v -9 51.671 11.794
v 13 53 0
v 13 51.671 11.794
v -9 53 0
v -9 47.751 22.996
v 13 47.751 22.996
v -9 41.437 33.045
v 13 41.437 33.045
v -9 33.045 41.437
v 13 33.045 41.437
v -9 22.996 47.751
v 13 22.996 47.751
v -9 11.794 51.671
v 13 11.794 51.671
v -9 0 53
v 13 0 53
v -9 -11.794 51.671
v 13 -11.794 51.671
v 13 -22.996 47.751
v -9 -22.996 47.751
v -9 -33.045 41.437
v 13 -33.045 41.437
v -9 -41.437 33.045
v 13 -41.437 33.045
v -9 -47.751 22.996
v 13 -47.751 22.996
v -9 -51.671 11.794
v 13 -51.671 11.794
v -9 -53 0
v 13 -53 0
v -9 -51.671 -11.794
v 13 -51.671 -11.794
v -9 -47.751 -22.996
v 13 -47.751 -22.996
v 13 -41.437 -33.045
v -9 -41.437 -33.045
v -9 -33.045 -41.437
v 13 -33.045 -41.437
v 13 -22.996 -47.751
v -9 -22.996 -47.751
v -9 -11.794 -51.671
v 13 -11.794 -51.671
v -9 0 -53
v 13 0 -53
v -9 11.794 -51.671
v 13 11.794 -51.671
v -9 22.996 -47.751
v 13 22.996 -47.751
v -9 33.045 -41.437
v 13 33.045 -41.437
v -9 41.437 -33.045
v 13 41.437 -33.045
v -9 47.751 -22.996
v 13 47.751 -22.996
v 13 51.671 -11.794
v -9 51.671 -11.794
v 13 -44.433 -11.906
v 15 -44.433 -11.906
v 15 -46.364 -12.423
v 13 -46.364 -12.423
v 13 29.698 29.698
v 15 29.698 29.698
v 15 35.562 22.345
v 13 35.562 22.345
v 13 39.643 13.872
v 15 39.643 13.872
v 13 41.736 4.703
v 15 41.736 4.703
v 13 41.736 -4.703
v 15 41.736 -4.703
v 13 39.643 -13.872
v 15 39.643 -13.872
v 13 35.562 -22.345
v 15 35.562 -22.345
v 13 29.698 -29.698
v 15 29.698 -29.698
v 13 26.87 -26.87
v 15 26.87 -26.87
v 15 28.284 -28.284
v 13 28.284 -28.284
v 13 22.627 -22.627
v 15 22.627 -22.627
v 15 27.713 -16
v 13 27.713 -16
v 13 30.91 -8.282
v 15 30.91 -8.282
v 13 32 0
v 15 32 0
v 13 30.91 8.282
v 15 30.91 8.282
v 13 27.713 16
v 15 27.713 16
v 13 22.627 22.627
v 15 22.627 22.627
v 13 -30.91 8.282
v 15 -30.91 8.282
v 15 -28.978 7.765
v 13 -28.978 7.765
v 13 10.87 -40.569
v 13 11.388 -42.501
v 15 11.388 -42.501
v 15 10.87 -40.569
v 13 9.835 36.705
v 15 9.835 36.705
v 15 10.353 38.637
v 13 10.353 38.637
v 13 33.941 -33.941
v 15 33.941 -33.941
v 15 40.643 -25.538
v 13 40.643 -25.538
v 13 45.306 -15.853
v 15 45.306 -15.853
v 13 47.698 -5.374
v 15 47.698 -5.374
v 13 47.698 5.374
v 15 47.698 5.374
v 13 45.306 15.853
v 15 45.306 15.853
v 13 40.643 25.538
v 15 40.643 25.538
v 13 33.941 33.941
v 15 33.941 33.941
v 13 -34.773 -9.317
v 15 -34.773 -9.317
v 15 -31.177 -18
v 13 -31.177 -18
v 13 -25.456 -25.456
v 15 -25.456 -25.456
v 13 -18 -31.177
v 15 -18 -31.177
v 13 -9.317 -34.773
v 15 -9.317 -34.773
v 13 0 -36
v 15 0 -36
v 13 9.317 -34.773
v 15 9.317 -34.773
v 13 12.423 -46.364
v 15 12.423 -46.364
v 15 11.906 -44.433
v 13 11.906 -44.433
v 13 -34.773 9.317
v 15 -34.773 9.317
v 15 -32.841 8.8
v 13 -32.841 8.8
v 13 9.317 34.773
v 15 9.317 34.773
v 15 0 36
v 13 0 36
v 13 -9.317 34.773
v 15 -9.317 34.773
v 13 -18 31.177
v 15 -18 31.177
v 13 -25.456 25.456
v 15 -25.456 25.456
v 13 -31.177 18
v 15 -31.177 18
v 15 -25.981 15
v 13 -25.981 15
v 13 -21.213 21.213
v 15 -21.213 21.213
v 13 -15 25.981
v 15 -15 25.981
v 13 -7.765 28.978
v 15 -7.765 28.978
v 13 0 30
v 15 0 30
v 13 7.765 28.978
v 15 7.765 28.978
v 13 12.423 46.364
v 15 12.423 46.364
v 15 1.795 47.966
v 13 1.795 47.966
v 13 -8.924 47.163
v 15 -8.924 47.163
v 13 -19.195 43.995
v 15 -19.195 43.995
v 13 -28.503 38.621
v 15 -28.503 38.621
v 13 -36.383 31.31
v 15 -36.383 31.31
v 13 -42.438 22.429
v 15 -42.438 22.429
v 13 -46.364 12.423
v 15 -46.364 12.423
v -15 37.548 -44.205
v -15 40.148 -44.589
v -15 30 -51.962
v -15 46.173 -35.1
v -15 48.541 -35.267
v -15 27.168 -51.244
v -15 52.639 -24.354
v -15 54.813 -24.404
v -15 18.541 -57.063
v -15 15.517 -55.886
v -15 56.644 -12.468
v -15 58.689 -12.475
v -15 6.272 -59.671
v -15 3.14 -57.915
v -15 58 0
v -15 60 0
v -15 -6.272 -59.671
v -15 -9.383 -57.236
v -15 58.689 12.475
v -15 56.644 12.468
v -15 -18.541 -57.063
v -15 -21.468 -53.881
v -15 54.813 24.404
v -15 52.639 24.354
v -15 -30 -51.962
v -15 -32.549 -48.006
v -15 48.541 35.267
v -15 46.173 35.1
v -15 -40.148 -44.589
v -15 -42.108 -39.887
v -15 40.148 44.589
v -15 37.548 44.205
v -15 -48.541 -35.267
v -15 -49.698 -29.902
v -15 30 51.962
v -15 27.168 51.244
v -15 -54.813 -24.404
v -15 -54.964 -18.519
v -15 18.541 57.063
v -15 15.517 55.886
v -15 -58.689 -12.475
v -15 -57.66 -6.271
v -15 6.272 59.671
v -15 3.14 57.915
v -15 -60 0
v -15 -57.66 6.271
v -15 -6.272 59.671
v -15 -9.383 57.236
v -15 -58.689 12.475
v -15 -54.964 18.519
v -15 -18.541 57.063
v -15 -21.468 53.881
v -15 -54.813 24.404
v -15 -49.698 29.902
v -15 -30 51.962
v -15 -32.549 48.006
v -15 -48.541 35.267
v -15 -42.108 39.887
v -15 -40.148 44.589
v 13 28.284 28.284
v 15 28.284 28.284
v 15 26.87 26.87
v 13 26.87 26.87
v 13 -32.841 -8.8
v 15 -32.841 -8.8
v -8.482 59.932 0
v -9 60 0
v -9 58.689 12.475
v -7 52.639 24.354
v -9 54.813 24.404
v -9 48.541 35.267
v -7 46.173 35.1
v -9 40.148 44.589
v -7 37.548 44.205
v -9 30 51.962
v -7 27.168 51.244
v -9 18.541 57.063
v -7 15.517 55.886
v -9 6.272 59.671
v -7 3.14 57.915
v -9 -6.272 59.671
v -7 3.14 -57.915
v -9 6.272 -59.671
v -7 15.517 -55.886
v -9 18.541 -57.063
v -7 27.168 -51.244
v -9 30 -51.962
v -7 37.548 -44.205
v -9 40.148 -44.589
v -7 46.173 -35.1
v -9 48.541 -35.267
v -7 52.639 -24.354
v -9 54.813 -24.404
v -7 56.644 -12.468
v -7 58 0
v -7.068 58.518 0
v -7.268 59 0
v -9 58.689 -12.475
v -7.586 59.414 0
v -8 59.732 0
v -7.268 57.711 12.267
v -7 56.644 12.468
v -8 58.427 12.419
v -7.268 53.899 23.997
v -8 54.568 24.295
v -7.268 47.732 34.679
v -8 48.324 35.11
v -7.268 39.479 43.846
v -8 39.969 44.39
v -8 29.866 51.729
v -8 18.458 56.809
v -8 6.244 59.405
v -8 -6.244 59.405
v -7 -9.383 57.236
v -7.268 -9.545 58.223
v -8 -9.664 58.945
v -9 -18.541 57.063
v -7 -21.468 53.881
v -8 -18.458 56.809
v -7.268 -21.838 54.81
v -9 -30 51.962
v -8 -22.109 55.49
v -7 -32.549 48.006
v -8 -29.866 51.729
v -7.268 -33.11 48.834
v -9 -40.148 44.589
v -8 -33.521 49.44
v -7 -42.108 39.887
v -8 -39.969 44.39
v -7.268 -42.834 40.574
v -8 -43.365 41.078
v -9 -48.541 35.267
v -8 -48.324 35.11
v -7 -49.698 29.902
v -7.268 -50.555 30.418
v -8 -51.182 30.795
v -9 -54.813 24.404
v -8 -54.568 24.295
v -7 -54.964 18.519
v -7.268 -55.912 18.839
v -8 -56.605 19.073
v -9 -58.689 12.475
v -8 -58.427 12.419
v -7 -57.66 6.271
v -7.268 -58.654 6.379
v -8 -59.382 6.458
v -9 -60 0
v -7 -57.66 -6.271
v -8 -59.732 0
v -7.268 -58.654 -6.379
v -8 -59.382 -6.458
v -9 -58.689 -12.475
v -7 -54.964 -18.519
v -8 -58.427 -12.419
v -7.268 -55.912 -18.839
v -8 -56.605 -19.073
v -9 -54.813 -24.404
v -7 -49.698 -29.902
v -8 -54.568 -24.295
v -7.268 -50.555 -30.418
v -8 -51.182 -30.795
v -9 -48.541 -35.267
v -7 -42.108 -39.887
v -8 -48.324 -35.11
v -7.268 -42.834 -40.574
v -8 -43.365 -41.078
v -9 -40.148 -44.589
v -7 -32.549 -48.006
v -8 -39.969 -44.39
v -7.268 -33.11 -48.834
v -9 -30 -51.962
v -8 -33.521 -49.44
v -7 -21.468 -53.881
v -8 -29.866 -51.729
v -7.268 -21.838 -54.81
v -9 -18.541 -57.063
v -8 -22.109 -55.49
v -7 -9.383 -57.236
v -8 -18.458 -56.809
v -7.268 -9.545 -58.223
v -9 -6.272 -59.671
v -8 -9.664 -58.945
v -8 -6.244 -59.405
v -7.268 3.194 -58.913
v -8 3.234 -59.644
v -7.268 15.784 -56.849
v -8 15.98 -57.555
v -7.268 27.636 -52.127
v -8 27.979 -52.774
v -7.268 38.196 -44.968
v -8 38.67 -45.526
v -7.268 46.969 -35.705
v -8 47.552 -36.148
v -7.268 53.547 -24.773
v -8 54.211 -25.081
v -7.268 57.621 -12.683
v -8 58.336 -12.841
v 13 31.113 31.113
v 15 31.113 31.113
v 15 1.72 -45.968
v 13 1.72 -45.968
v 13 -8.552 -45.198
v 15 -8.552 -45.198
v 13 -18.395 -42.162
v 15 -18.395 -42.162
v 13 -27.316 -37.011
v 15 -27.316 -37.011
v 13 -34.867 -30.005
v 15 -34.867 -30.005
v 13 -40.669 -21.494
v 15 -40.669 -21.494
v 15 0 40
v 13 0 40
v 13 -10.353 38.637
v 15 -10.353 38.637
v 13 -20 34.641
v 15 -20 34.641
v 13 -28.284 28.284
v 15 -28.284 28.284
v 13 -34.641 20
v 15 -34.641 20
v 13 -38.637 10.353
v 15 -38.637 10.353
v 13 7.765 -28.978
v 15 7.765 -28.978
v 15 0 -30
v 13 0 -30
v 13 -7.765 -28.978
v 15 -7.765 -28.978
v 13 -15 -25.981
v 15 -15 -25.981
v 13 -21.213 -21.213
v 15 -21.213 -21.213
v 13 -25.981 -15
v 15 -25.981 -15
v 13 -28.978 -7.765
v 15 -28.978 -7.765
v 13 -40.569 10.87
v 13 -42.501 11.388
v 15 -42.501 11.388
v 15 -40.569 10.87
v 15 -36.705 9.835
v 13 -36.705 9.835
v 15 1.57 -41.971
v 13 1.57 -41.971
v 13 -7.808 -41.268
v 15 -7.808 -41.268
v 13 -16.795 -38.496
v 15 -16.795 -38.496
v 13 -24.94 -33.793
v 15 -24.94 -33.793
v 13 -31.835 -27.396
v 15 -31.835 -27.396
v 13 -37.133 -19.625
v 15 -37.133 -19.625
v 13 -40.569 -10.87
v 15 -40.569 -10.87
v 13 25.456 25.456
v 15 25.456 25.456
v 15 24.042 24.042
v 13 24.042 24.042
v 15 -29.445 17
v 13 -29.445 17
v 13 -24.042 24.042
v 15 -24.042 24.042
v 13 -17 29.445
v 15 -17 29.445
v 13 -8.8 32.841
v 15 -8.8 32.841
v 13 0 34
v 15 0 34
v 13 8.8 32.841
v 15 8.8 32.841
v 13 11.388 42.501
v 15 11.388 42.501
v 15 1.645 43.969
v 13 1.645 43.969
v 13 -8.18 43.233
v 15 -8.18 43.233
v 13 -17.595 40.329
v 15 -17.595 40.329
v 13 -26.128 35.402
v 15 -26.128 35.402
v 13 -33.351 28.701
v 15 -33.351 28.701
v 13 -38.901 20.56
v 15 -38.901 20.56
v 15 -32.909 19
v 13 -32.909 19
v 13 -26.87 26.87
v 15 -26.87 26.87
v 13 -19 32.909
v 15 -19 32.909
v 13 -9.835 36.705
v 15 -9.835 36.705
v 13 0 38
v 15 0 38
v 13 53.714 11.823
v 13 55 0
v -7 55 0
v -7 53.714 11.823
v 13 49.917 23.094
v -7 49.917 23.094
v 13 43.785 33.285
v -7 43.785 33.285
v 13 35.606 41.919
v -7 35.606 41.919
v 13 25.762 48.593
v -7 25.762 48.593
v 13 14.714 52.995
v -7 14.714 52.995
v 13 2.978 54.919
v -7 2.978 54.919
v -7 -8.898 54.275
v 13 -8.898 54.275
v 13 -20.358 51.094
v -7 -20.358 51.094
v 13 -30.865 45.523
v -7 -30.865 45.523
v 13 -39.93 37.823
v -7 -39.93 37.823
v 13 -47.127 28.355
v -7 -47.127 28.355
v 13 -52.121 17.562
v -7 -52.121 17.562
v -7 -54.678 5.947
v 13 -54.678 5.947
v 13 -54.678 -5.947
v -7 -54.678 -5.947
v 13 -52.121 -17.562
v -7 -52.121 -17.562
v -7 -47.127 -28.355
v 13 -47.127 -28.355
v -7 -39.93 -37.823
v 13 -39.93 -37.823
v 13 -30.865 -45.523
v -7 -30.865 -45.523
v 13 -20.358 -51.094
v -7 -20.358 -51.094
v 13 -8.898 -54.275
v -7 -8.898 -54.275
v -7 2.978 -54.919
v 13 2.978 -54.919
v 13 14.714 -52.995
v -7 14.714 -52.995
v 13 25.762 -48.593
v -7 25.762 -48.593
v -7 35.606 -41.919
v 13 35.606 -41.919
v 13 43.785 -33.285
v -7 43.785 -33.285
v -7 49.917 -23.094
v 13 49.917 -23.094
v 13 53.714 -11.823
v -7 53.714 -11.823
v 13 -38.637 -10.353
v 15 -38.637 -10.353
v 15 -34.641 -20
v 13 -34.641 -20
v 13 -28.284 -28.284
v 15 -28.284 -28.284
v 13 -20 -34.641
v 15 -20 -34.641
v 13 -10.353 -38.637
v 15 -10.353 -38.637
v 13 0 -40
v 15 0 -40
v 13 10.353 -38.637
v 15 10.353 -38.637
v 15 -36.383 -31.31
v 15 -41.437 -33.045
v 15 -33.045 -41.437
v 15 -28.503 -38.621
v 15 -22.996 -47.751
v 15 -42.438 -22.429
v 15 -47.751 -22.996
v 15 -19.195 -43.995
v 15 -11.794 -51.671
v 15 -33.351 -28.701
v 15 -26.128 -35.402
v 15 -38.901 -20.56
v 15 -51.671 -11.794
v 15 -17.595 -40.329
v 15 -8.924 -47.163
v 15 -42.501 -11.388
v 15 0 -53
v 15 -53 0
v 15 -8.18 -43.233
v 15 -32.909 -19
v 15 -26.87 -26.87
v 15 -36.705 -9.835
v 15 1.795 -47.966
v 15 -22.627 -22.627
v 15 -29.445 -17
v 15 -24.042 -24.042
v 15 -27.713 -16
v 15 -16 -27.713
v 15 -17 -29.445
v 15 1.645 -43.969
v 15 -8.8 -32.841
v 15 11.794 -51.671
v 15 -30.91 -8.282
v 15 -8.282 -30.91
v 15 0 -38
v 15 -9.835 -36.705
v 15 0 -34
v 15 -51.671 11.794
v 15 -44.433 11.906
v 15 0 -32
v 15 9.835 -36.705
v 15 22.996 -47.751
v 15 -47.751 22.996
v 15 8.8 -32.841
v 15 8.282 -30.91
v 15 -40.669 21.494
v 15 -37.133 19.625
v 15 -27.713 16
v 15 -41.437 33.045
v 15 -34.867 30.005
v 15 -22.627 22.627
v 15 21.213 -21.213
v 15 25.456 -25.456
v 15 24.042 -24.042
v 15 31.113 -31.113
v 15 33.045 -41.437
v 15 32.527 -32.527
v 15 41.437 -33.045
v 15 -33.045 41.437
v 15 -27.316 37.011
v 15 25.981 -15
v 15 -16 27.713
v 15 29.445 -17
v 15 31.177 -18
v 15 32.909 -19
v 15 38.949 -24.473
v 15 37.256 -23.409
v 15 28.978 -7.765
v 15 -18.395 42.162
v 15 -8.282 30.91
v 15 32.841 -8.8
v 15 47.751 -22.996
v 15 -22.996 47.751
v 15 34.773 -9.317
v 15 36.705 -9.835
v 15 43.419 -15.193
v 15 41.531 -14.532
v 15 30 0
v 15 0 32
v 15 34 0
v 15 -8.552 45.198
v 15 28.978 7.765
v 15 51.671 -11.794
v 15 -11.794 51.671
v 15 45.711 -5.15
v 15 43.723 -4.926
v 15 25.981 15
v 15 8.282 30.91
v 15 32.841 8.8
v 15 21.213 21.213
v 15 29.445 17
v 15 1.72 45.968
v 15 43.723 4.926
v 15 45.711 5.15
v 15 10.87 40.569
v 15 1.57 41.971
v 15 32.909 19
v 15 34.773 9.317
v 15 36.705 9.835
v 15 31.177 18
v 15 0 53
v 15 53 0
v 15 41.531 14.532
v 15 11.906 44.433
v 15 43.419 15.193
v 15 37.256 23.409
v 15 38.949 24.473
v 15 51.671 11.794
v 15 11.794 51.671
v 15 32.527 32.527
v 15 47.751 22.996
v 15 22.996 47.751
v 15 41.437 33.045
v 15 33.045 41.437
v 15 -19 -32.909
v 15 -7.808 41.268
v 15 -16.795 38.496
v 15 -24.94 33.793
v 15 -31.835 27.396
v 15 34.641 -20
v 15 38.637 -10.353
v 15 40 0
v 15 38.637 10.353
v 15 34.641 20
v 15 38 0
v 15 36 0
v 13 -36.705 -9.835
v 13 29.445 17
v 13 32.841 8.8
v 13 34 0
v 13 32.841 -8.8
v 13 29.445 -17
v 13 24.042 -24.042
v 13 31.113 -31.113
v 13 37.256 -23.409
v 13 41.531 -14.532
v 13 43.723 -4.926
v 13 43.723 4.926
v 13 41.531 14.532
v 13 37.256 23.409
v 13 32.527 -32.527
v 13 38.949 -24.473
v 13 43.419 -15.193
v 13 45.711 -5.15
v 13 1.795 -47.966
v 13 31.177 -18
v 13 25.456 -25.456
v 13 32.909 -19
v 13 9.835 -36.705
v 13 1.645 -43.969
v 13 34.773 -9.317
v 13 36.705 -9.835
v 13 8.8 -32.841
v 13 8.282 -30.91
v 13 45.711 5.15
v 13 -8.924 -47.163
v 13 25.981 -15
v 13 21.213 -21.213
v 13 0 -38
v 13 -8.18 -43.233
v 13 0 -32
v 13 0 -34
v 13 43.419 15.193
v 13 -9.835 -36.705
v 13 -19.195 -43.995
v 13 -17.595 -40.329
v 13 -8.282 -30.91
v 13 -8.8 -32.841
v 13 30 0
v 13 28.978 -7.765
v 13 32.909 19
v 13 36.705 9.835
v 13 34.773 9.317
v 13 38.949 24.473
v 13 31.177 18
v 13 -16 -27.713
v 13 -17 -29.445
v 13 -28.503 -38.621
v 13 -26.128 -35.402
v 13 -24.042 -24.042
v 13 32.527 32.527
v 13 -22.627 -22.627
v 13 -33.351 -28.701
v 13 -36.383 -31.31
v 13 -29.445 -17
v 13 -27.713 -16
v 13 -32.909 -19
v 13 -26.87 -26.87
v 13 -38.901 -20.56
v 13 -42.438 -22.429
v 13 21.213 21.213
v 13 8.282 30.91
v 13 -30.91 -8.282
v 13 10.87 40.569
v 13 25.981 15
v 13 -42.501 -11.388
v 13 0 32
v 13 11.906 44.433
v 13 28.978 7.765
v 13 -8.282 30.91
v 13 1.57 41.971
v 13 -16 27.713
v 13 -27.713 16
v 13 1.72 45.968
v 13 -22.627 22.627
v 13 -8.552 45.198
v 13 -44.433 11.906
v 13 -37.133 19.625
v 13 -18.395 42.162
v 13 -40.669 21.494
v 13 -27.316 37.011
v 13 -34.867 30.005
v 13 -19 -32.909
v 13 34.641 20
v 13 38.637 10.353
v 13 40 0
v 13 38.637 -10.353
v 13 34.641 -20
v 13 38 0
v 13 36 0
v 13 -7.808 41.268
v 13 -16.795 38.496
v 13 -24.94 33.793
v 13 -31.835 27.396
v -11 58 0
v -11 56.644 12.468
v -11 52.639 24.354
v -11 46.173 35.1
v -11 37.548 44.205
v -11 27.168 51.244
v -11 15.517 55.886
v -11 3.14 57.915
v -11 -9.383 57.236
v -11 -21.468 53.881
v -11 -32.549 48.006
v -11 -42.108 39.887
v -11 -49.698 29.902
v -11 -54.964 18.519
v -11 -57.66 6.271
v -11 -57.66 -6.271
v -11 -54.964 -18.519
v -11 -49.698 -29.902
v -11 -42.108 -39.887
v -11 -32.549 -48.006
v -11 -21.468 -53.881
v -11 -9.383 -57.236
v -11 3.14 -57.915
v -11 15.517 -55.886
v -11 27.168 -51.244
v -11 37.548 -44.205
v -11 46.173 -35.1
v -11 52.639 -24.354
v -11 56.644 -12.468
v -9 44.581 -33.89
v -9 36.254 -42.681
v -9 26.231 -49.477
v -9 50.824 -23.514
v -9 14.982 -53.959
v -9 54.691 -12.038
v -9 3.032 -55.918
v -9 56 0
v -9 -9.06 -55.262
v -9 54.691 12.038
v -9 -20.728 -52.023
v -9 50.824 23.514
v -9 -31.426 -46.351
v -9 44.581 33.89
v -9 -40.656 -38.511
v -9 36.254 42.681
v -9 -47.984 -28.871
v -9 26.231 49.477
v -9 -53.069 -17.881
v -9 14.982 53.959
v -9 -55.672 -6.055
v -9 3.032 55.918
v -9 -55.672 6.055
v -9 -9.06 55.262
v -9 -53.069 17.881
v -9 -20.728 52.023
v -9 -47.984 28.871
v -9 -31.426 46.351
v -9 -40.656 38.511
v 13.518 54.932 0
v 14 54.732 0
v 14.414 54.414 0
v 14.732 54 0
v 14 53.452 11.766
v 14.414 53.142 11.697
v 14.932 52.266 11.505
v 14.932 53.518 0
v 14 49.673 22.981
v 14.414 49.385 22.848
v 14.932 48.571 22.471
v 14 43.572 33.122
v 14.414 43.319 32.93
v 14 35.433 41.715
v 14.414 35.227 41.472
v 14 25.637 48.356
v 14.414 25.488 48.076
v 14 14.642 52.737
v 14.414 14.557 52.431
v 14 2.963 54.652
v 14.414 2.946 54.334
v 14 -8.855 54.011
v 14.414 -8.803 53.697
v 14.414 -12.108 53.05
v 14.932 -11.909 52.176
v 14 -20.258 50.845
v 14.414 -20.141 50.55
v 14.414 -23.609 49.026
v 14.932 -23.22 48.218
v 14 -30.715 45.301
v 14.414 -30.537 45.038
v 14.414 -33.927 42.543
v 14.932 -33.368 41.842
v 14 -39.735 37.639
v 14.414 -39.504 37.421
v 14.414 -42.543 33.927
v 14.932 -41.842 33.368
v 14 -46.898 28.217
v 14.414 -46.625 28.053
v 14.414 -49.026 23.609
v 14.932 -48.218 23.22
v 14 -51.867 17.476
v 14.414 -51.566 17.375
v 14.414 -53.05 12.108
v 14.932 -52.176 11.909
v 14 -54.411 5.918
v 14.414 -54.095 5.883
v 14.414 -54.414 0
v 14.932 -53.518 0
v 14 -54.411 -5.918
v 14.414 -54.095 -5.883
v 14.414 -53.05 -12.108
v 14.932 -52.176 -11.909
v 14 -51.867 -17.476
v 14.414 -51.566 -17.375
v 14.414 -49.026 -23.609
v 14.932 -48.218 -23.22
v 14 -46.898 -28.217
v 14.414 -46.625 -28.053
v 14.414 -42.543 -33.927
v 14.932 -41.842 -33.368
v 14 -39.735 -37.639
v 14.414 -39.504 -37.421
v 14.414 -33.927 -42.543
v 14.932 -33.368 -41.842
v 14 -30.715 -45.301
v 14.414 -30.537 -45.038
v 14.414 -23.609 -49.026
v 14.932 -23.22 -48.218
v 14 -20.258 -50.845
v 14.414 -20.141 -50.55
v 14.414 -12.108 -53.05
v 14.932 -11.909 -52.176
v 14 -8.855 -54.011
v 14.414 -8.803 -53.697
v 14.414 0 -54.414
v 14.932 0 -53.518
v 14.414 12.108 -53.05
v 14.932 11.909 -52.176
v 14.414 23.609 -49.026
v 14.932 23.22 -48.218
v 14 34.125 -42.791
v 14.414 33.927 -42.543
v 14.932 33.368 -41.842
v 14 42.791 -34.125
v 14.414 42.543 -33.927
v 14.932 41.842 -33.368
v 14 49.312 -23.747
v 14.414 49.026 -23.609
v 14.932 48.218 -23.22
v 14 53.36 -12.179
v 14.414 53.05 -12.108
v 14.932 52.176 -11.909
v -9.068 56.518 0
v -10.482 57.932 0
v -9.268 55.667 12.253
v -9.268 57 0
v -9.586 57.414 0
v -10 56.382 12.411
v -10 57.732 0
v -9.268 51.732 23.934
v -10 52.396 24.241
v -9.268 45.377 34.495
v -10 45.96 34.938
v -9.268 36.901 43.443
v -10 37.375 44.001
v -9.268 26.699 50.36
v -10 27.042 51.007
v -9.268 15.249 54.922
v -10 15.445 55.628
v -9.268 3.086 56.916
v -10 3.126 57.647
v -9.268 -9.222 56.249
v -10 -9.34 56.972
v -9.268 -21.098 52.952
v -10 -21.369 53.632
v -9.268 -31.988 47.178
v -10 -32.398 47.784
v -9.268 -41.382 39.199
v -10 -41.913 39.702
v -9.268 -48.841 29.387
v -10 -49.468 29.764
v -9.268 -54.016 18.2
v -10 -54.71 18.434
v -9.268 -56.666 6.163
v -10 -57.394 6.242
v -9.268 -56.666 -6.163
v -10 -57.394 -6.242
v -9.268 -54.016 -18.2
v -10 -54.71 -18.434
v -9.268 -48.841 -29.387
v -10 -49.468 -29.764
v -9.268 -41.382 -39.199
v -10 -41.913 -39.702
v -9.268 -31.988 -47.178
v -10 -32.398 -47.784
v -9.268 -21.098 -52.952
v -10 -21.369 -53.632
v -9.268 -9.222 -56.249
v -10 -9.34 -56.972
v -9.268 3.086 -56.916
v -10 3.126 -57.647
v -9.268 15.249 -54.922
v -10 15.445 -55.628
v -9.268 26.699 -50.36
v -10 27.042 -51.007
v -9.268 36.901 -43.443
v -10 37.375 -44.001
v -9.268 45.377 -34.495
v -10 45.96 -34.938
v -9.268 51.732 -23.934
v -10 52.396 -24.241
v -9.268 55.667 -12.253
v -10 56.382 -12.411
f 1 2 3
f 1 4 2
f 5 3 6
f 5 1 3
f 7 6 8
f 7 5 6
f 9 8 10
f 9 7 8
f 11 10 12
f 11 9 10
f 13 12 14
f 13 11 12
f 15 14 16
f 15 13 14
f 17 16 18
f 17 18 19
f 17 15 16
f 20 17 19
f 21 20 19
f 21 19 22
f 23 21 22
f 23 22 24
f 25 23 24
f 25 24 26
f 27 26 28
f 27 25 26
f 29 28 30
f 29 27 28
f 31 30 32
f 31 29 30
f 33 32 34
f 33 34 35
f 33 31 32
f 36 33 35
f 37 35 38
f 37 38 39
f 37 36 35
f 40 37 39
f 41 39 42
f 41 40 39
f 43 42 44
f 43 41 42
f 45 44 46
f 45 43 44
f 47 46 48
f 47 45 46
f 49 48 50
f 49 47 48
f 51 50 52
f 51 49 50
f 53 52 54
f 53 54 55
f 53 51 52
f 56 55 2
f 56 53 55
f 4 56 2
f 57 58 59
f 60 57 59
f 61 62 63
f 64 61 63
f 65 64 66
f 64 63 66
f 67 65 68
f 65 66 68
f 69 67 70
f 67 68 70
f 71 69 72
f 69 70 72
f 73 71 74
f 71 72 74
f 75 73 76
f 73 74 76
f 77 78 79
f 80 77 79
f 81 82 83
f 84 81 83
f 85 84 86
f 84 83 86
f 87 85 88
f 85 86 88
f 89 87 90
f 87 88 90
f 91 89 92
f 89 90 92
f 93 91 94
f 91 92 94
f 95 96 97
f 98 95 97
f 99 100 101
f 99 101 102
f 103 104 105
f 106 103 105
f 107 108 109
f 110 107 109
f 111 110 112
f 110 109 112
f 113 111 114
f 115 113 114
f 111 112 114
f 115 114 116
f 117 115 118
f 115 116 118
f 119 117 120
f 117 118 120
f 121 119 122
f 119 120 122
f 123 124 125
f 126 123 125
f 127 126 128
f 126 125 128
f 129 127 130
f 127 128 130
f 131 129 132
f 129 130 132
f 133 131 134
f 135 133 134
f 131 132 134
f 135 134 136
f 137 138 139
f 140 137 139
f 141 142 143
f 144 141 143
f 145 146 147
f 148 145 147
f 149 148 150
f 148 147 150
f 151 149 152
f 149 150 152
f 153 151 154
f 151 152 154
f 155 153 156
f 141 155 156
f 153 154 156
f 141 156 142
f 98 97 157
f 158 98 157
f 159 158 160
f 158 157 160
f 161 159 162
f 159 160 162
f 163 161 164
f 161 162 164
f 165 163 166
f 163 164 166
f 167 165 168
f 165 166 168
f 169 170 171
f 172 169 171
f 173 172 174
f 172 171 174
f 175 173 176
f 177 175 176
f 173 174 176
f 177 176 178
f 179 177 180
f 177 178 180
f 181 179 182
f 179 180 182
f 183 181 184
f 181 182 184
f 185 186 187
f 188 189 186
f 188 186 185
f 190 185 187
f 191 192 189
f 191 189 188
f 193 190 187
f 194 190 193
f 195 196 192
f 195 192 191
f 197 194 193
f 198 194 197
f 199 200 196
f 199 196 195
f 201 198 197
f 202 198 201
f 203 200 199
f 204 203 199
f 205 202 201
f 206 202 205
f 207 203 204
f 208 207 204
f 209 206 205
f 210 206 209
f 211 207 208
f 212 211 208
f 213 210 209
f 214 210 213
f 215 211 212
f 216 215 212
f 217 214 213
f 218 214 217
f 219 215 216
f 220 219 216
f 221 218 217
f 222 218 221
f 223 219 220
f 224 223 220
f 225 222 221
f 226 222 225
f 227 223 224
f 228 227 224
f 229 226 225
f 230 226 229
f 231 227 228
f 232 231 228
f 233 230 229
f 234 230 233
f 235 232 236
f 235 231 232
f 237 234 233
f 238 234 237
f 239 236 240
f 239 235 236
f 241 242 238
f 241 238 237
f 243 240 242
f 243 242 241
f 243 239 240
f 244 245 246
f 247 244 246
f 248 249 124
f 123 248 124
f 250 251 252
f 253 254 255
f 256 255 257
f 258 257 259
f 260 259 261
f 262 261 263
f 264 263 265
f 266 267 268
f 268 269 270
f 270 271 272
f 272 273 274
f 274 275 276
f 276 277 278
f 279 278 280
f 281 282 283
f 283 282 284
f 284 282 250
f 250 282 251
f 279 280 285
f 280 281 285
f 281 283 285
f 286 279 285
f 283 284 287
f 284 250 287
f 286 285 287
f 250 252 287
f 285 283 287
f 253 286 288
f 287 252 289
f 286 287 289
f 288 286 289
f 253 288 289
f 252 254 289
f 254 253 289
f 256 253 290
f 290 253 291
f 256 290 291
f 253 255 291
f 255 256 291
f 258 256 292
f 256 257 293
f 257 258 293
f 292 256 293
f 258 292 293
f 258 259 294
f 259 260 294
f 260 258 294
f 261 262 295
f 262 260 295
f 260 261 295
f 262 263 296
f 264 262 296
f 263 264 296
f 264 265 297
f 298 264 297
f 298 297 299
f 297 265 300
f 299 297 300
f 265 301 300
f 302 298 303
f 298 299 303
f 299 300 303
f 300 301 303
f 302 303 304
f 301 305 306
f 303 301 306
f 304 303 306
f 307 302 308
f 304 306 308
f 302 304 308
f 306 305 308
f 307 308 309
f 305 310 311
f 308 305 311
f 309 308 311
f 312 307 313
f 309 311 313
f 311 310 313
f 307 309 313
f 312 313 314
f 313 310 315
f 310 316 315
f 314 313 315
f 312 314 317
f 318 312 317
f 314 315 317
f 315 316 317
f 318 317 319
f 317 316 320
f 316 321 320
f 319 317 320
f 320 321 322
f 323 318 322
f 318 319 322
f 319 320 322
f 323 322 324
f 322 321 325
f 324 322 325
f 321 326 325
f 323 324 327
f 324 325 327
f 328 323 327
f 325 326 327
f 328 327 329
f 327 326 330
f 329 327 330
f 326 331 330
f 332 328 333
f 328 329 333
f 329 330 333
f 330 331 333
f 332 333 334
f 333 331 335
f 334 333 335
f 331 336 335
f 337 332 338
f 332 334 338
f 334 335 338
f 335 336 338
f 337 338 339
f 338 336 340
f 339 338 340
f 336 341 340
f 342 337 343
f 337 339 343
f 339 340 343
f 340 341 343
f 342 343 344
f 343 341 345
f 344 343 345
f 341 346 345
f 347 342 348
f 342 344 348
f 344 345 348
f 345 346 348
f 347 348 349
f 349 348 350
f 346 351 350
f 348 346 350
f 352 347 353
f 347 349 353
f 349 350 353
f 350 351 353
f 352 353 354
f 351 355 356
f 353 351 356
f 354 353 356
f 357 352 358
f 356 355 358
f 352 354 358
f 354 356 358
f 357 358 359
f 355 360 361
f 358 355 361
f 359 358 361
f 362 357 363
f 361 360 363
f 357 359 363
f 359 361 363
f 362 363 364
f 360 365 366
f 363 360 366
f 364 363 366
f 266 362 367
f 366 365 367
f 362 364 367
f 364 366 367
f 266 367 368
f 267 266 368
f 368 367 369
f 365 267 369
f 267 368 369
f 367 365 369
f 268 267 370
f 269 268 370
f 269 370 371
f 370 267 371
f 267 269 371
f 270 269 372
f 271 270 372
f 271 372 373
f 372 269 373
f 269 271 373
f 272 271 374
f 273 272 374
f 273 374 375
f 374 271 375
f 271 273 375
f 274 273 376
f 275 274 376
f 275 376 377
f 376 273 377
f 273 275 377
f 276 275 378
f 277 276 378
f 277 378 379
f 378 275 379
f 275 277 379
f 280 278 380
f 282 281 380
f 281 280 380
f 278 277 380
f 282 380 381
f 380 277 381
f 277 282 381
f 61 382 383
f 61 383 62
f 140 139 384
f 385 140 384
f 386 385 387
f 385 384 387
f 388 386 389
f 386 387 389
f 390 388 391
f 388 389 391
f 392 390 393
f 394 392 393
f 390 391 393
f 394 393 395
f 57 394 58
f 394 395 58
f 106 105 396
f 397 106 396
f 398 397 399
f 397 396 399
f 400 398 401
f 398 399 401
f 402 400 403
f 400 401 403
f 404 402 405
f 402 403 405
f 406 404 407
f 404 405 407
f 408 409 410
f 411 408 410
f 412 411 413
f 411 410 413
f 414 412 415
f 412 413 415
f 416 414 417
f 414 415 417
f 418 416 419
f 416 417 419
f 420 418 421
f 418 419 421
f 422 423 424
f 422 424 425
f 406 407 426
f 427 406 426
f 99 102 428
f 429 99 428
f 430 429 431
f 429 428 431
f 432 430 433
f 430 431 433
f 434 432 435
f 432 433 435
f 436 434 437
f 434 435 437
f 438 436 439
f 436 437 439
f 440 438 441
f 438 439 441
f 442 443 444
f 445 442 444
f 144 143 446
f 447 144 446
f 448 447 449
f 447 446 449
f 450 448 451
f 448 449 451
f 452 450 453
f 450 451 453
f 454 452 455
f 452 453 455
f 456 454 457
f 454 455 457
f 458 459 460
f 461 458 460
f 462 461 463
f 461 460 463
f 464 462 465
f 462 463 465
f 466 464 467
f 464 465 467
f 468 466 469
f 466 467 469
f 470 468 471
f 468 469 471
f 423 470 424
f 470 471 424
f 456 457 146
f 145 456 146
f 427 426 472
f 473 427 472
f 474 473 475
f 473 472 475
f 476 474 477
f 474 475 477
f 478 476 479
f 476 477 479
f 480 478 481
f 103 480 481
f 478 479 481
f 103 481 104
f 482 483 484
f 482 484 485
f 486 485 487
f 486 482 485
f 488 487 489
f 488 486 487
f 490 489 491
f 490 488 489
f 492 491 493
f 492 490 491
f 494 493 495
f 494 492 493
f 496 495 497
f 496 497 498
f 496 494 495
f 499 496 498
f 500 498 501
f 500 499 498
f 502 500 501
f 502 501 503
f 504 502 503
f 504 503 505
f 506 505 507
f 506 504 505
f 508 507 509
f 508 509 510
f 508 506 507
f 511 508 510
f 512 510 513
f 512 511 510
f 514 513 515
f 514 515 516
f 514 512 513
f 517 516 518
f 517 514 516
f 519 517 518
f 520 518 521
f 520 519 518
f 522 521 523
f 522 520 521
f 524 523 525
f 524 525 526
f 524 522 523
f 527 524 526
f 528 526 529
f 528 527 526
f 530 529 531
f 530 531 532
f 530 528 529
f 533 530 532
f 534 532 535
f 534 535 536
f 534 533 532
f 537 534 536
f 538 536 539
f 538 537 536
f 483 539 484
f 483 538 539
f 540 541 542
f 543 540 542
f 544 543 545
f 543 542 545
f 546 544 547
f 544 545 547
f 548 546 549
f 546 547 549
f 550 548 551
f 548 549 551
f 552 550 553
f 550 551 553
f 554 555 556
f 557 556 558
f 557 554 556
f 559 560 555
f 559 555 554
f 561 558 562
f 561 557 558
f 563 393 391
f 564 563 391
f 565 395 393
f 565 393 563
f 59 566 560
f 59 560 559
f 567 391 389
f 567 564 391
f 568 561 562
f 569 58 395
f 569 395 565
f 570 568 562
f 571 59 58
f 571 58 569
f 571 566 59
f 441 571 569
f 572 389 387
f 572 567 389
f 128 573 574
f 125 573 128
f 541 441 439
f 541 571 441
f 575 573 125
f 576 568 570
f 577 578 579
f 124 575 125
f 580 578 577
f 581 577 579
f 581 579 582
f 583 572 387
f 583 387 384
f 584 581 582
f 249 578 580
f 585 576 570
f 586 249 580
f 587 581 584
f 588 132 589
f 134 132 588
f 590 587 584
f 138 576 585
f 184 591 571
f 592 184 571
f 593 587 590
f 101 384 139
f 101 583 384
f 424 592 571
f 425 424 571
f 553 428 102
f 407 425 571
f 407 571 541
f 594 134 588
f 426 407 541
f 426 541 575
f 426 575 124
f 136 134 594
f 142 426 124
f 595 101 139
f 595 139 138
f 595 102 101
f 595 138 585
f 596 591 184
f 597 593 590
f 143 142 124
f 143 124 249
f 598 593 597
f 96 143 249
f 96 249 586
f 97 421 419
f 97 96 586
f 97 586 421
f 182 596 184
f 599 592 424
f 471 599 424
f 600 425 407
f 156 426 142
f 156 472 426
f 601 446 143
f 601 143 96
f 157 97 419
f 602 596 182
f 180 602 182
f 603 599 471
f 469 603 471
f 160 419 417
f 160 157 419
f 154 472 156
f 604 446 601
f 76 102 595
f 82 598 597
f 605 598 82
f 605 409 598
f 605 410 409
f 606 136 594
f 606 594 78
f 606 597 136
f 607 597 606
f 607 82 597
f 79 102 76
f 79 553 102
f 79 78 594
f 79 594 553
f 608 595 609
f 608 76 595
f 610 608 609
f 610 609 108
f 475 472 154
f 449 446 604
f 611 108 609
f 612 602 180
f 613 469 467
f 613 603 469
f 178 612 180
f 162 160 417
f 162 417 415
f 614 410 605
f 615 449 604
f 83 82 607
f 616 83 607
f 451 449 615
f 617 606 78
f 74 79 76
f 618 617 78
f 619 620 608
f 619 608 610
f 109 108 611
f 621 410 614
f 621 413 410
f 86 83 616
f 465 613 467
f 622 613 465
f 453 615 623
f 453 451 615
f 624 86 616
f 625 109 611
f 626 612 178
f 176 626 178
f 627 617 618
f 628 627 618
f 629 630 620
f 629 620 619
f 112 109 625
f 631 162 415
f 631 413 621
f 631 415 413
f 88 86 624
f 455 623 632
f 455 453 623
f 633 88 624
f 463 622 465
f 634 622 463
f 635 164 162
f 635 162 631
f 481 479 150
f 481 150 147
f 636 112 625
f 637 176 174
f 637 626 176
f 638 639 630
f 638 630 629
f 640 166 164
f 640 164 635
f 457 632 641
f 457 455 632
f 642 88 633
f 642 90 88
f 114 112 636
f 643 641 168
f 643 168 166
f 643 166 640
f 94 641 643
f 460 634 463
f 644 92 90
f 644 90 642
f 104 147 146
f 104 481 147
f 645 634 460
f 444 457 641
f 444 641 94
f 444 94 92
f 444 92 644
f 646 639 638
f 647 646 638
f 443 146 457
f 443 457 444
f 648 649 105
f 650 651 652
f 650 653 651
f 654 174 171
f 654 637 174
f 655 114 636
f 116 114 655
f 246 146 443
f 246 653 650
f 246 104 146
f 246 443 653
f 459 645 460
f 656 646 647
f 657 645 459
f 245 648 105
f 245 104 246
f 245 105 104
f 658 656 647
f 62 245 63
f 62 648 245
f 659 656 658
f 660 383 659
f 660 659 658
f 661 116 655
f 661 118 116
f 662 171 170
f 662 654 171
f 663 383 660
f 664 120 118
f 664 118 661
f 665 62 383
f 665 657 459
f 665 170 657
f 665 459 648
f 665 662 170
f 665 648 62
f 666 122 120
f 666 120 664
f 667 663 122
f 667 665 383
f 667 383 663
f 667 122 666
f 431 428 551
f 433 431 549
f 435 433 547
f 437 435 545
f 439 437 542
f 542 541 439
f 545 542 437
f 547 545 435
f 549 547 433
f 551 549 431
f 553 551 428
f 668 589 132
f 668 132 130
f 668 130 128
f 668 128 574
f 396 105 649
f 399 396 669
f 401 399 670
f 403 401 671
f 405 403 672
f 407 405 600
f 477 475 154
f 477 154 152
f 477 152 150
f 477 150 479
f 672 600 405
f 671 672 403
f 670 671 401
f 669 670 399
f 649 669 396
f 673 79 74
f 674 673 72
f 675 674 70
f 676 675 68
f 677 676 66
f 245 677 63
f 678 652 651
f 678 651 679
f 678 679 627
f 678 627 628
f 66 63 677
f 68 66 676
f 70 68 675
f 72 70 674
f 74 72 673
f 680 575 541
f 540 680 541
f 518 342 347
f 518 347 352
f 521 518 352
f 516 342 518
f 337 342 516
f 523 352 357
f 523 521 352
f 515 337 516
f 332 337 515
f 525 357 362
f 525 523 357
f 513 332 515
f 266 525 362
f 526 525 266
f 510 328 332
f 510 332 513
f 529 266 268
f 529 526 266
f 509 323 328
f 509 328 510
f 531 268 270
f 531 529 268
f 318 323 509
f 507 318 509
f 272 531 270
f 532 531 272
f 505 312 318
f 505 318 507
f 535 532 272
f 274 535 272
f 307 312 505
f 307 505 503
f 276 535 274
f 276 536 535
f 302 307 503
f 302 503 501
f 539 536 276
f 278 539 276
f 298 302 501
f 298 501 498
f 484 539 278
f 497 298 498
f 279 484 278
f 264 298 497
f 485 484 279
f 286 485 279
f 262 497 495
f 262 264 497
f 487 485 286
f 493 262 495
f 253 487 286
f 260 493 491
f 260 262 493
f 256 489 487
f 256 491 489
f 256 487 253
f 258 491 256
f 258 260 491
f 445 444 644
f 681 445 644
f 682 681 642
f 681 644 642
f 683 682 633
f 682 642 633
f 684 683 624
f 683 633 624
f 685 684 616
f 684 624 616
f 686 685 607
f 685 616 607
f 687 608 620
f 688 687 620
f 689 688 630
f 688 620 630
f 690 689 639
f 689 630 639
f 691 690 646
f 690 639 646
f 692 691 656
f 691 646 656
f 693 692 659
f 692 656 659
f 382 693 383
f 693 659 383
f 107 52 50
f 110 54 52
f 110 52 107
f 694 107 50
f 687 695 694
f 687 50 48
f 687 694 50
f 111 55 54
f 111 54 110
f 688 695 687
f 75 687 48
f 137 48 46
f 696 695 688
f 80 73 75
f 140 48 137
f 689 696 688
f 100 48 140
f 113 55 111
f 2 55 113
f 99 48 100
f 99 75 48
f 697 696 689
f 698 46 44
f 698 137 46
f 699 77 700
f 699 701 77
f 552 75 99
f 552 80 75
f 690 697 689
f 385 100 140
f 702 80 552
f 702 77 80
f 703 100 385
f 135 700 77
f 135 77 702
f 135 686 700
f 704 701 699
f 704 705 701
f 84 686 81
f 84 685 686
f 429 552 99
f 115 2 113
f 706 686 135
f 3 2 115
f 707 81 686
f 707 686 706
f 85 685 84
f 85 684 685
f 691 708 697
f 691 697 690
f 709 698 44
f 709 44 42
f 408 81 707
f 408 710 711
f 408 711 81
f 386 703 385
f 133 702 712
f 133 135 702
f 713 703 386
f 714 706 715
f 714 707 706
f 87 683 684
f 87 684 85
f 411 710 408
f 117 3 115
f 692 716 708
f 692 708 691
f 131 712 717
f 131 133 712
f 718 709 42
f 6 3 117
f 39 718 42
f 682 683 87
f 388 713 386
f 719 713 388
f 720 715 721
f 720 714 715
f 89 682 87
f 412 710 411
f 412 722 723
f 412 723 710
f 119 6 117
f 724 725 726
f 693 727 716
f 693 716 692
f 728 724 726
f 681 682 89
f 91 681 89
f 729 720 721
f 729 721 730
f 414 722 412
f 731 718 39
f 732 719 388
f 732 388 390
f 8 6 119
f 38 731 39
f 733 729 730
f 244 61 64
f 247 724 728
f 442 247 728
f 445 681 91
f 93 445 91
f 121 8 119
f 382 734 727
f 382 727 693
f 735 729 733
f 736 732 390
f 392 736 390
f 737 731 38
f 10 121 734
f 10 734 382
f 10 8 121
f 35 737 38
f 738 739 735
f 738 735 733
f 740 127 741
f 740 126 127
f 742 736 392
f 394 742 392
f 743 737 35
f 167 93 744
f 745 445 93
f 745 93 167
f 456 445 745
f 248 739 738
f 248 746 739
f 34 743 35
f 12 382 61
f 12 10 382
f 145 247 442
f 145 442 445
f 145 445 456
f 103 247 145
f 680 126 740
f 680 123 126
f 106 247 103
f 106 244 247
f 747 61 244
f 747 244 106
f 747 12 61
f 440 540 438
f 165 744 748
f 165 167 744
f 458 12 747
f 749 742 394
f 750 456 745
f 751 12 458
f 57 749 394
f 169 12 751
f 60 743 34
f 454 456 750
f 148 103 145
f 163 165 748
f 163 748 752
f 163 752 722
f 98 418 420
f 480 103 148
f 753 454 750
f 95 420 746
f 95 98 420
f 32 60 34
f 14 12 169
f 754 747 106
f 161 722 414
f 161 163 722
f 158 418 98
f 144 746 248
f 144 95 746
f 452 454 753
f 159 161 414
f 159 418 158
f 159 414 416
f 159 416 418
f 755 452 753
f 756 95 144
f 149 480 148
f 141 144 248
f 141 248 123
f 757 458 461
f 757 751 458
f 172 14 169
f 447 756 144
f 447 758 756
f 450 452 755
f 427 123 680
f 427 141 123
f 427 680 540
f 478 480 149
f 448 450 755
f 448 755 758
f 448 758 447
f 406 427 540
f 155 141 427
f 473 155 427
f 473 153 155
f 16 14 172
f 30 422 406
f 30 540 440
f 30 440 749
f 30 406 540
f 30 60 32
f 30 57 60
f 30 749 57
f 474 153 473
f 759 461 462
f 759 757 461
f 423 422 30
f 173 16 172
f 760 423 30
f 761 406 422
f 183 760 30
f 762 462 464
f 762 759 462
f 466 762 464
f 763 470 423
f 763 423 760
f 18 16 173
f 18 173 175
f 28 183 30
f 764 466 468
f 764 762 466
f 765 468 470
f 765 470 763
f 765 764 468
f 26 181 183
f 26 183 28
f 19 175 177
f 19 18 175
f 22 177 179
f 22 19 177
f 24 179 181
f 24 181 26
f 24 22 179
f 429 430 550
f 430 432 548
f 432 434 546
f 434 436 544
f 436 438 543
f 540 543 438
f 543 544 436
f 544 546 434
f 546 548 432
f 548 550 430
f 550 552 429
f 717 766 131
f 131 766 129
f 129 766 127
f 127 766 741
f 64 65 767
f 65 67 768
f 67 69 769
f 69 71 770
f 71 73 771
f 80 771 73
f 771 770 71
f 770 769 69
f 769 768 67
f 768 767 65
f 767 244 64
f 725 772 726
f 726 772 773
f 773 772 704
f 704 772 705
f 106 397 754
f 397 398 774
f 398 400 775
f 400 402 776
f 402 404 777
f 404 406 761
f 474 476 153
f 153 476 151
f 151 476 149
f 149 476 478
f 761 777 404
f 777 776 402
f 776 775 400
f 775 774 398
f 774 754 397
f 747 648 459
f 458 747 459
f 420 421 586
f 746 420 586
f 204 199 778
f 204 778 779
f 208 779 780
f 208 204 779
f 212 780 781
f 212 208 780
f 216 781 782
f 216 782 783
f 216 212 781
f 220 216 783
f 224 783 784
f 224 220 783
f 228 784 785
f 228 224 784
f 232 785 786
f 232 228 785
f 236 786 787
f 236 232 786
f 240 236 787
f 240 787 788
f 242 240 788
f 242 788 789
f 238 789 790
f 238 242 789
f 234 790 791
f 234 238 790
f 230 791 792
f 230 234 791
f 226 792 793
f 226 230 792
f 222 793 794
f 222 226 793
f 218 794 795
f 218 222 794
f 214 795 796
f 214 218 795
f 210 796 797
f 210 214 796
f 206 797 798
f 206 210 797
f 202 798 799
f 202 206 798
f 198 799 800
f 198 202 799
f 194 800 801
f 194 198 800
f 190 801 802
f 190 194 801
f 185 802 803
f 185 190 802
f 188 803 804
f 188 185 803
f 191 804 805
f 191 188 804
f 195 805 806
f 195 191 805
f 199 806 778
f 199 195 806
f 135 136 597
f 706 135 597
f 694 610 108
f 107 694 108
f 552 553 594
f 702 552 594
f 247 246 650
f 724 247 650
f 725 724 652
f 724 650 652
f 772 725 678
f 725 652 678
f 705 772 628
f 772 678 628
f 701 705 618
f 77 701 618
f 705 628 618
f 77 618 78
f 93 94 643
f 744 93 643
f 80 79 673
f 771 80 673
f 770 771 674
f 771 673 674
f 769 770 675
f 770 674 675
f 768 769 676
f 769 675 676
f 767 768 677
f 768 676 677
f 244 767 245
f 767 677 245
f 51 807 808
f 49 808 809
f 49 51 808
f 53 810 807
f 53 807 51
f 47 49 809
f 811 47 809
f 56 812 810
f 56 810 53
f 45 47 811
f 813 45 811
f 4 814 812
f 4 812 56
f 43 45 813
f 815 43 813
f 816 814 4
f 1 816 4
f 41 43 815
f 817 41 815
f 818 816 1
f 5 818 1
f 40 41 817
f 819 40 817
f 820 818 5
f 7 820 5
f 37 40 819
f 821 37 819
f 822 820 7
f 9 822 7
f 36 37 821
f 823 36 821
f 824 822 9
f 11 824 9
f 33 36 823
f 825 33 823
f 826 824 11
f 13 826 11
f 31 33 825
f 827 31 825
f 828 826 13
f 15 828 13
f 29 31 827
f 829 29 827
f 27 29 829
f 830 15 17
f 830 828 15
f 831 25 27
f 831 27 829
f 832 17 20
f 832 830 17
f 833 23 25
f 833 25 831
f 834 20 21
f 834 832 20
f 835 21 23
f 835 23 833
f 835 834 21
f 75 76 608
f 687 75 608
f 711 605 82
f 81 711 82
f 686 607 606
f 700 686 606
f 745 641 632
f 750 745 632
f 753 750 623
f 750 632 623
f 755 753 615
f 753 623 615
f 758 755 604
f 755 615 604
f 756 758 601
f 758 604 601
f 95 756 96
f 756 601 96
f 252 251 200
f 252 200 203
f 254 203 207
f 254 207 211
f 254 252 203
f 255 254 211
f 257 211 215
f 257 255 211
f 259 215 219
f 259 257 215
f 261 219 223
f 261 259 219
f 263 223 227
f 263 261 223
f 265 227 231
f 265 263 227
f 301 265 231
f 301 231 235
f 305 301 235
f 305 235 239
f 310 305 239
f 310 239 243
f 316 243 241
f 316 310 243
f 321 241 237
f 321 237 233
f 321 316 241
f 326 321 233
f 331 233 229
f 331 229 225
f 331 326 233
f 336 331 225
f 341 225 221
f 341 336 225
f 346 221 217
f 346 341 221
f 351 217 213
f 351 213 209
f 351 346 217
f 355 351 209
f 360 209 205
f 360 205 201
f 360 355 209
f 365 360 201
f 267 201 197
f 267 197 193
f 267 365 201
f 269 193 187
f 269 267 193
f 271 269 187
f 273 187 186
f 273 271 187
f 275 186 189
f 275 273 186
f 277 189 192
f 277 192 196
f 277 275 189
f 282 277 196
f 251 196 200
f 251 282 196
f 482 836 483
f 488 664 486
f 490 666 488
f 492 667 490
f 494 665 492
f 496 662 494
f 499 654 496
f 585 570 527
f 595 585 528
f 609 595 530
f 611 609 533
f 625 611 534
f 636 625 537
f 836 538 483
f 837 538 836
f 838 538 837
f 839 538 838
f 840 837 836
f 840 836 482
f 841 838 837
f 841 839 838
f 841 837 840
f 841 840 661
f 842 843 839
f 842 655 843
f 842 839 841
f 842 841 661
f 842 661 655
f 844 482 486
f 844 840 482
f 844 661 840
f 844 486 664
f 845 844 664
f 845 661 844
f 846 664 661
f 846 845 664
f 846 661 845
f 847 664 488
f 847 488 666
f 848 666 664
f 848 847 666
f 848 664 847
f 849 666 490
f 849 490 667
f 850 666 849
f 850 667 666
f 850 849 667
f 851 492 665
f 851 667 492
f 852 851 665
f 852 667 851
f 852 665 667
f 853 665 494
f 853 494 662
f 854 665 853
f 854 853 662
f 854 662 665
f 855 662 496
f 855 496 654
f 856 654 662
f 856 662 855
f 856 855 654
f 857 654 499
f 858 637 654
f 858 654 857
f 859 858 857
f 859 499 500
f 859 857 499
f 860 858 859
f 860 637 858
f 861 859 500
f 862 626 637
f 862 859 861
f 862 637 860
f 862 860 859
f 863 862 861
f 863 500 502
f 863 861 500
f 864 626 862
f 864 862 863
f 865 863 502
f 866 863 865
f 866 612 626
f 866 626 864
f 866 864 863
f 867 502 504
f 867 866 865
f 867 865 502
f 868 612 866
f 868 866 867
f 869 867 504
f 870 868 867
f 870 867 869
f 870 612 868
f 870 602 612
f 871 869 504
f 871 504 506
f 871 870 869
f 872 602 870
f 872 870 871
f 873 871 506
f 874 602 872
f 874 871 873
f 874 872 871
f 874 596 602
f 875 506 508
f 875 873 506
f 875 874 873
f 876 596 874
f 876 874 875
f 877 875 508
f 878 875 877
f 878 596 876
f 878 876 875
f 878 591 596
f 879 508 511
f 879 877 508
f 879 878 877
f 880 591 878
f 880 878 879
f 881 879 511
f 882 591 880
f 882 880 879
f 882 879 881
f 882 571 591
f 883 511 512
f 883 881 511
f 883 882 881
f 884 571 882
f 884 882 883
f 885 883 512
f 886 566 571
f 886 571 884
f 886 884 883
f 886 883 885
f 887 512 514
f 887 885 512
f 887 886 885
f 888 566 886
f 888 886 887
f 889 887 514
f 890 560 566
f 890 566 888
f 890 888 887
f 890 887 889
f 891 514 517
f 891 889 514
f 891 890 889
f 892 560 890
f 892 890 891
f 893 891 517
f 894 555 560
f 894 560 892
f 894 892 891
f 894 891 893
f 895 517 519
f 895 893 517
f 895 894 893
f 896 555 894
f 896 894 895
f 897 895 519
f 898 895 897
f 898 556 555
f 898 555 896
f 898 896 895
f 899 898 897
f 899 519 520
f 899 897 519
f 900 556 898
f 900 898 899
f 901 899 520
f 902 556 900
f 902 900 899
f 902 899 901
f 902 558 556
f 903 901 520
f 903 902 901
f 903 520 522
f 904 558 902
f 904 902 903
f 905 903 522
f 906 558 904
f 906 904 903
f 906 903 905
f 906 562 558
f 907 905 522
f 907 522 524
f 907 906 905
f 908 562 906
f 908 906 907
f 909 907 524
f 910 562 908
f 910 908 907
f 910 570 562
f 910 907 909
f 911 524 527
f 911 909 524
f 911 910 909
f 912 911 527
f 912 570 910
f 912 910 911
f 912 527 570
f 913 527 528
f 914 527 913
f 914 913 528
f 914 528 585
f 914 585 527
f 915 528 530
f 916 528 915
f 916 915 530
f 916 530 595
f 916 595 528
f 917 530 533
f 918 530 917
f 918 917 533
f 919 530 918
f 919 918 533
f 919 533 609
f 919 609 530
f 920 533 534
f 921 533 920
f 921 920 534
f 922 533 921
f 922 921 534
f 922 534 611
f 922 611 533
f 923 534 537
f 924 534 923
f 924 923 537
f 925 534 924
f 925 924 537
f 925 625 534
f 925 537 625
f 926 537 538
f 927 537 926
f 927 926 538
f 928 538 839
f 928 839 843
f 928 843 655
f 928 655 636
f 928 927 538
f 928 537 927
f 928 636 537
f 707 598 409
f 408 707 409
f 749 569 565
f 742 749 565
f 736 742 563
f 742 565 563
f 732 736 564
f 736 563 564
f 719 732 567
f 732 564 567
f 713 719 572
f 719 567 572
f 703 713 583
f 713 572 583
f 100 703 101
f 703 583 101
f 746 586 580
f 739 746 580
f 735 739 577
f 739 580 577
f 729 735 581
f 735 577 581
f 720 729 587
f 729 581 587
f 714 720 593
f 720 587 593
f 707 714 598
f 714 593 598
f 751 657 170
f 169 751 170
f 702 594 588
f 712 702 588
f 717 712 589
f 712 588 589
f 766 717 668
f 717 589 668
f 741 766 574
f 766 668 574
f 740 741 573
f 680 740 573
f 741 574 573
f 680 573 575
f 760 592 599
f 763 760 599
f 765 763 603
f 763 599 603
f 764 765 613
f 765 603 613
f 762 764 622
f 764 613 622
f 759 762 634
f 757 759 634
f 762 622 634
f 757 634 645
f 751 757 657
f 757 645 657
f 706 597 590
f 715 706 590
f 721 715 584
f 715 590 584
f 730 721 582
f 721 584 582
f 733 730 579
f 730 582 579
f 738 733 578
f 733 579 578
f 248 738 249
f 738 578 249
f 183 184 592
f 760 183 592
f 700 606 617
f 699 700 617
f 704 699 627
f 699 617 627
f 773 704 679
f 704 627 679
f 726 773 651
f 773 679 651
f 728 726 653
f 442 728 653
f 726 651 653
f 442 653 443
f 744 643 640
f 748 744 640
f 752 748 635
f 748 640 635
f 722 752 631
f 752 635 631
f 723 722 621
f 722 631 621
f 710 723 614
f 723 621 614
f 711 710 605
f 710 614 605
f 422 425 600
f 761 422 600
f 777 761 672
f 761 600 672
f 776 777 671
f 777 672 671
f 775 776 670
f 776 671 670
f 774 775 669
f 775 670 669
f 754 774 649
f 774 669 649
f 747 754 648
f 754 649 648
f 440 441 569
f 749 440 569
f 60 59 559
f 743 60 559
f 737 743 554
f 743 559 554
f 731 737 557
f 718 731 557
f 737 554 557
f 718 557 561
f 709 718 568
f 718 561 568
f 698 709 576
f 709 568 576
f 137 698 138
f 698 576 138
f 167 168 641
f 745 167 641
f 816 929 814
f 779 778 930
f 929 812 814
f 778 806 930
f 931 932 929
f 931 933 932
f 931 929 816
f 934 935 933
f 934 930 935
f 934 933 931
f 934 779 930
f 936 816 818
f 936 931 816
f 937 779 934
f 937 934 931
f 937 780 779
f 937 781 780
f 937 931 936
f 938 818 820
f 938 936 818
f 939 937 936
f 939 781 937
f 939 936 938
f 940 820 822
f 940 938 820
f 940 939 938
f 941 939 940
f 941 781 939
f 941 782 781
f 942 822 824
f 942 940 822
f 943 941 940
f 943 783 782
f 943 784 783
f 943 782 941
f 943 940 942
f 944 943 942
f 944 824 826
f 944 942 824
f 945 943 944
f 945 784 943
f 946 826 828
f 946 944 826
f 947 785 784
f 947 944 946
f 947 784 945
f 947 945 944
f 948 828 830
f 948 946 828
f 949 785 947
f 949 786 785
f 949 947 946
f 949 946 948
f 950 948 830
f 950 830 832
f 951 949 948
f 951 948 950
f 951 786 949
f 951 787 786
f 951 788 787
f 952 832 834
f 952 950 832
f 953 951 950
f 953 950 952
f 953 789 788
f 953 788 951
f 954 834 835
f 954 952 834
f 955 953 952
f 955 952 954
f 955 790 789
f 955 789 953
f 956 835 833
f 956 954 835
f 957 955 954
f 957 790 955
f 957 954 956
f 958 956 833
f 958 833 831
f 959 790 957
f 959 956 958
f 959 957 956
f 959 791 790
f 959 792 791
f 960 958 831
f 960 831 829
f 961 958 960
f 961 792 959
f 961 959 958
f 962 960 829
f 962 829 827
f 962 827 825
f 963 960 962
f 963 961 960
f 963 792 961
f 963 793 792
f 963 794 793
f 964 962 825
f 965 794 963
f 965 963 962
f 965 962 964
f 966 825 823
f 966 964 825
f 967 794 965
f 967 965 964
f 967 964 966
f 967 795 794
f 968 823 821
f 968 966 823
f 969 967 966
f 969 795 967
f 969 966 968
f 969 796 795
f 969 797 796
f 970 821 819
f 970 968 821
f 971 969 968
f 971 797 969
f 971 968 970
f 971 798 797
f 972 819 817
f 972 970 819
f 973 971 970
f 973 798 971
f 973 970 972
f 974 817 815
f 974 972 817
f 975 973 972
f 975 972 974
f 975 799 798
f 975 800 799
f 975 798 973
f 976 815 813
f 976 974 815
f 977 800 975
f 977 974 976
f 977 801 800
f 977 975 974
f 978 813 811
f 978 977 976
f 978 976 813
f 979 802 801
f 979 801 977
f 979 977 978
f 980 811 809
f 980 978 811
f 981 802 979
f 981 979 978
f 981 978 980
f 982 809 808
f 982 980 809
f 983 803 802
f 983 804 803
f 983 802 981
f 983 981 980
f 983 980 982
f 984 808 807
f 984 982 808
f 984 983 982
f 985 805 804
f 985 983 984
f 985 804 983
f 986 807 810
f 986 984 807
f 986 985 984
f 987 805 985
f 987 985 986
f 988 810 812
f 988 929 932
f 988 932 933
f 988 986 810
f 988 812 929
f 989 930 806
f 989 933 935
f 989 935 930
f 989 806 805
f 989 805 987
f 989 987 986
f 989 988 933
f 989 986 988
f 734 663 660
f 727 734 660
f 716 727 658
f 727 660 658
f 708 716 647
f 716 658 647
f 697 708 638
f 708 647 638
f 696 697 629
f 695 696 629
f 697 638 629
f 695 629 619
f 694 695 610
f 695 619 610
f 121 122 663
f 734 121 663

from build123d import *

# Parameters (mm, degrees)
FILLET1_R          = 2
FILLET2_R          = 2
CUT_EXTRUDE2_DEPTH = 2
CIRPATTERN1_COUNT  = 3


with BuildPart() as part:
    # Sketch1 → Revolve2 (revolve)
    with BuildSketch(Plane.XY):
        Polygon((-15, 60), (-7, 60), (-7, 55), (15, 55), (15, 0), (13, 0), (13, 53), (-9, 53), (-9, 58), (-15, 58), align=None)
    revolve(axis=Axis((-15, 0, 0), (1, 0, 0)))

    # Fillet1
    fillet1_edges = [part.edges().sort_by_distance(p)[0] for p in [
        (15, -55, 0),
        (-9, -58, 0),
    ]]
    fillet(fillet1_edges, radius=FILLET1_R)

    # Fillet2
    fillet2_edges = [part.edges().sort_by_distance(p)[0] for p in [
        (-7, -60, 0),
    ]]
    fillet(fillet2_edges, radius=FILLET2_R)

    # Sketch2 → Cut-Extrude2 (cut)
    with BuildSketch(Plane(origin=(15, 0, 0), x_dir=(0, 0, -1), z_dir=(1, 0, 0))):
        with BuildLine():
            Line((-22.627416998, 22.627416998), (-21.213203436, 21.213203436))
            ThreePointArc((-21.213203436, 21.213203436), (0, 30), (21.213203436, 21.213203436))
            Line((21.213203436, 21.213203436), (22.627416998, 22.627416998))
            ThreePointArc((22.627416998, 22.627416998), (0, 32), (-22.627416998, 22.627416998))
        make_face()
        with BuildLine():
            Line((-25.455844123, 25.455844123), (-24.04163056, 24.04163056))
            ThreePointArc((-24.04163056, 24.04163056), (0, 34), (24.04163056, 24.04163056))
            Line((24.04163056, 24.04163056), (25.455844123, 25.455844123))
            ThreePointArc((25.455844123, 25.455844123), (0, 36), (-25.455844123, 25.455844123))
        make_face()
        with BuildLine():
            Line((-28.284271247, 28.284271247), (-26.870057685, 26.870057685))
            ThreePointArc((-26.870057685, 26.870057685), (0, 38), (26.870057685, 26.870057685))
            Line((26.870057685, 26.870057685), (28.284271247, 28.284271247))
            ThreePointArc((28.284271247, 28.284271247), (0, 40), (-28.284271247, 28.284271247))
        make_face()
        with BuildLine():
            Line((-31.112698372, 31.112698372), (-29.69848481, 29.69848481))
            ThreePointArc((-29.69848481, 29.69848481), (0, 42), (29.69848481, 29.69848481))
            Line((29.69848481, 29.69848481), (31.112698372, 31.112698372))
            ThreePointArc((31.112698372, 31.112698372), (0, 44), (-31.112698372, 31.112698372))
        make_face()
        with BuildLine():
            Line((-33.941125497, 33.941125497), (-32.526911935, 32.526911935))
            ThreePointArc((-32.526911935, 32.526911935), (0, 46), (32.526911935, 32.526911935))
            Line((32.526911935, 32.526911935), (33.941125497, 33.941125497))
            ThreePointArc((33.941125497, 33.941125497), (0, 48), (-33.941125497, 33.941125497))
        make_face()
    cut_extrude2 = extrude(amount=-CUT_EXTRUDE2_DEPTH, mode=Mode.SUBTRACT)

    # CirPattern1: Cut-Extrude2 ×3 about axis
    cirpattern1_axis = Axis((0, 0, 0), (1, 0, 0))
    for i in range(1, CIRPATTERN1_COUNT):
        add(cut_extrude2.rotate(cirpattern1_axis, i * 360 / CIRPATTERN1_COUNT), mode=Mode.SUBTRACT)


solid = part.part
